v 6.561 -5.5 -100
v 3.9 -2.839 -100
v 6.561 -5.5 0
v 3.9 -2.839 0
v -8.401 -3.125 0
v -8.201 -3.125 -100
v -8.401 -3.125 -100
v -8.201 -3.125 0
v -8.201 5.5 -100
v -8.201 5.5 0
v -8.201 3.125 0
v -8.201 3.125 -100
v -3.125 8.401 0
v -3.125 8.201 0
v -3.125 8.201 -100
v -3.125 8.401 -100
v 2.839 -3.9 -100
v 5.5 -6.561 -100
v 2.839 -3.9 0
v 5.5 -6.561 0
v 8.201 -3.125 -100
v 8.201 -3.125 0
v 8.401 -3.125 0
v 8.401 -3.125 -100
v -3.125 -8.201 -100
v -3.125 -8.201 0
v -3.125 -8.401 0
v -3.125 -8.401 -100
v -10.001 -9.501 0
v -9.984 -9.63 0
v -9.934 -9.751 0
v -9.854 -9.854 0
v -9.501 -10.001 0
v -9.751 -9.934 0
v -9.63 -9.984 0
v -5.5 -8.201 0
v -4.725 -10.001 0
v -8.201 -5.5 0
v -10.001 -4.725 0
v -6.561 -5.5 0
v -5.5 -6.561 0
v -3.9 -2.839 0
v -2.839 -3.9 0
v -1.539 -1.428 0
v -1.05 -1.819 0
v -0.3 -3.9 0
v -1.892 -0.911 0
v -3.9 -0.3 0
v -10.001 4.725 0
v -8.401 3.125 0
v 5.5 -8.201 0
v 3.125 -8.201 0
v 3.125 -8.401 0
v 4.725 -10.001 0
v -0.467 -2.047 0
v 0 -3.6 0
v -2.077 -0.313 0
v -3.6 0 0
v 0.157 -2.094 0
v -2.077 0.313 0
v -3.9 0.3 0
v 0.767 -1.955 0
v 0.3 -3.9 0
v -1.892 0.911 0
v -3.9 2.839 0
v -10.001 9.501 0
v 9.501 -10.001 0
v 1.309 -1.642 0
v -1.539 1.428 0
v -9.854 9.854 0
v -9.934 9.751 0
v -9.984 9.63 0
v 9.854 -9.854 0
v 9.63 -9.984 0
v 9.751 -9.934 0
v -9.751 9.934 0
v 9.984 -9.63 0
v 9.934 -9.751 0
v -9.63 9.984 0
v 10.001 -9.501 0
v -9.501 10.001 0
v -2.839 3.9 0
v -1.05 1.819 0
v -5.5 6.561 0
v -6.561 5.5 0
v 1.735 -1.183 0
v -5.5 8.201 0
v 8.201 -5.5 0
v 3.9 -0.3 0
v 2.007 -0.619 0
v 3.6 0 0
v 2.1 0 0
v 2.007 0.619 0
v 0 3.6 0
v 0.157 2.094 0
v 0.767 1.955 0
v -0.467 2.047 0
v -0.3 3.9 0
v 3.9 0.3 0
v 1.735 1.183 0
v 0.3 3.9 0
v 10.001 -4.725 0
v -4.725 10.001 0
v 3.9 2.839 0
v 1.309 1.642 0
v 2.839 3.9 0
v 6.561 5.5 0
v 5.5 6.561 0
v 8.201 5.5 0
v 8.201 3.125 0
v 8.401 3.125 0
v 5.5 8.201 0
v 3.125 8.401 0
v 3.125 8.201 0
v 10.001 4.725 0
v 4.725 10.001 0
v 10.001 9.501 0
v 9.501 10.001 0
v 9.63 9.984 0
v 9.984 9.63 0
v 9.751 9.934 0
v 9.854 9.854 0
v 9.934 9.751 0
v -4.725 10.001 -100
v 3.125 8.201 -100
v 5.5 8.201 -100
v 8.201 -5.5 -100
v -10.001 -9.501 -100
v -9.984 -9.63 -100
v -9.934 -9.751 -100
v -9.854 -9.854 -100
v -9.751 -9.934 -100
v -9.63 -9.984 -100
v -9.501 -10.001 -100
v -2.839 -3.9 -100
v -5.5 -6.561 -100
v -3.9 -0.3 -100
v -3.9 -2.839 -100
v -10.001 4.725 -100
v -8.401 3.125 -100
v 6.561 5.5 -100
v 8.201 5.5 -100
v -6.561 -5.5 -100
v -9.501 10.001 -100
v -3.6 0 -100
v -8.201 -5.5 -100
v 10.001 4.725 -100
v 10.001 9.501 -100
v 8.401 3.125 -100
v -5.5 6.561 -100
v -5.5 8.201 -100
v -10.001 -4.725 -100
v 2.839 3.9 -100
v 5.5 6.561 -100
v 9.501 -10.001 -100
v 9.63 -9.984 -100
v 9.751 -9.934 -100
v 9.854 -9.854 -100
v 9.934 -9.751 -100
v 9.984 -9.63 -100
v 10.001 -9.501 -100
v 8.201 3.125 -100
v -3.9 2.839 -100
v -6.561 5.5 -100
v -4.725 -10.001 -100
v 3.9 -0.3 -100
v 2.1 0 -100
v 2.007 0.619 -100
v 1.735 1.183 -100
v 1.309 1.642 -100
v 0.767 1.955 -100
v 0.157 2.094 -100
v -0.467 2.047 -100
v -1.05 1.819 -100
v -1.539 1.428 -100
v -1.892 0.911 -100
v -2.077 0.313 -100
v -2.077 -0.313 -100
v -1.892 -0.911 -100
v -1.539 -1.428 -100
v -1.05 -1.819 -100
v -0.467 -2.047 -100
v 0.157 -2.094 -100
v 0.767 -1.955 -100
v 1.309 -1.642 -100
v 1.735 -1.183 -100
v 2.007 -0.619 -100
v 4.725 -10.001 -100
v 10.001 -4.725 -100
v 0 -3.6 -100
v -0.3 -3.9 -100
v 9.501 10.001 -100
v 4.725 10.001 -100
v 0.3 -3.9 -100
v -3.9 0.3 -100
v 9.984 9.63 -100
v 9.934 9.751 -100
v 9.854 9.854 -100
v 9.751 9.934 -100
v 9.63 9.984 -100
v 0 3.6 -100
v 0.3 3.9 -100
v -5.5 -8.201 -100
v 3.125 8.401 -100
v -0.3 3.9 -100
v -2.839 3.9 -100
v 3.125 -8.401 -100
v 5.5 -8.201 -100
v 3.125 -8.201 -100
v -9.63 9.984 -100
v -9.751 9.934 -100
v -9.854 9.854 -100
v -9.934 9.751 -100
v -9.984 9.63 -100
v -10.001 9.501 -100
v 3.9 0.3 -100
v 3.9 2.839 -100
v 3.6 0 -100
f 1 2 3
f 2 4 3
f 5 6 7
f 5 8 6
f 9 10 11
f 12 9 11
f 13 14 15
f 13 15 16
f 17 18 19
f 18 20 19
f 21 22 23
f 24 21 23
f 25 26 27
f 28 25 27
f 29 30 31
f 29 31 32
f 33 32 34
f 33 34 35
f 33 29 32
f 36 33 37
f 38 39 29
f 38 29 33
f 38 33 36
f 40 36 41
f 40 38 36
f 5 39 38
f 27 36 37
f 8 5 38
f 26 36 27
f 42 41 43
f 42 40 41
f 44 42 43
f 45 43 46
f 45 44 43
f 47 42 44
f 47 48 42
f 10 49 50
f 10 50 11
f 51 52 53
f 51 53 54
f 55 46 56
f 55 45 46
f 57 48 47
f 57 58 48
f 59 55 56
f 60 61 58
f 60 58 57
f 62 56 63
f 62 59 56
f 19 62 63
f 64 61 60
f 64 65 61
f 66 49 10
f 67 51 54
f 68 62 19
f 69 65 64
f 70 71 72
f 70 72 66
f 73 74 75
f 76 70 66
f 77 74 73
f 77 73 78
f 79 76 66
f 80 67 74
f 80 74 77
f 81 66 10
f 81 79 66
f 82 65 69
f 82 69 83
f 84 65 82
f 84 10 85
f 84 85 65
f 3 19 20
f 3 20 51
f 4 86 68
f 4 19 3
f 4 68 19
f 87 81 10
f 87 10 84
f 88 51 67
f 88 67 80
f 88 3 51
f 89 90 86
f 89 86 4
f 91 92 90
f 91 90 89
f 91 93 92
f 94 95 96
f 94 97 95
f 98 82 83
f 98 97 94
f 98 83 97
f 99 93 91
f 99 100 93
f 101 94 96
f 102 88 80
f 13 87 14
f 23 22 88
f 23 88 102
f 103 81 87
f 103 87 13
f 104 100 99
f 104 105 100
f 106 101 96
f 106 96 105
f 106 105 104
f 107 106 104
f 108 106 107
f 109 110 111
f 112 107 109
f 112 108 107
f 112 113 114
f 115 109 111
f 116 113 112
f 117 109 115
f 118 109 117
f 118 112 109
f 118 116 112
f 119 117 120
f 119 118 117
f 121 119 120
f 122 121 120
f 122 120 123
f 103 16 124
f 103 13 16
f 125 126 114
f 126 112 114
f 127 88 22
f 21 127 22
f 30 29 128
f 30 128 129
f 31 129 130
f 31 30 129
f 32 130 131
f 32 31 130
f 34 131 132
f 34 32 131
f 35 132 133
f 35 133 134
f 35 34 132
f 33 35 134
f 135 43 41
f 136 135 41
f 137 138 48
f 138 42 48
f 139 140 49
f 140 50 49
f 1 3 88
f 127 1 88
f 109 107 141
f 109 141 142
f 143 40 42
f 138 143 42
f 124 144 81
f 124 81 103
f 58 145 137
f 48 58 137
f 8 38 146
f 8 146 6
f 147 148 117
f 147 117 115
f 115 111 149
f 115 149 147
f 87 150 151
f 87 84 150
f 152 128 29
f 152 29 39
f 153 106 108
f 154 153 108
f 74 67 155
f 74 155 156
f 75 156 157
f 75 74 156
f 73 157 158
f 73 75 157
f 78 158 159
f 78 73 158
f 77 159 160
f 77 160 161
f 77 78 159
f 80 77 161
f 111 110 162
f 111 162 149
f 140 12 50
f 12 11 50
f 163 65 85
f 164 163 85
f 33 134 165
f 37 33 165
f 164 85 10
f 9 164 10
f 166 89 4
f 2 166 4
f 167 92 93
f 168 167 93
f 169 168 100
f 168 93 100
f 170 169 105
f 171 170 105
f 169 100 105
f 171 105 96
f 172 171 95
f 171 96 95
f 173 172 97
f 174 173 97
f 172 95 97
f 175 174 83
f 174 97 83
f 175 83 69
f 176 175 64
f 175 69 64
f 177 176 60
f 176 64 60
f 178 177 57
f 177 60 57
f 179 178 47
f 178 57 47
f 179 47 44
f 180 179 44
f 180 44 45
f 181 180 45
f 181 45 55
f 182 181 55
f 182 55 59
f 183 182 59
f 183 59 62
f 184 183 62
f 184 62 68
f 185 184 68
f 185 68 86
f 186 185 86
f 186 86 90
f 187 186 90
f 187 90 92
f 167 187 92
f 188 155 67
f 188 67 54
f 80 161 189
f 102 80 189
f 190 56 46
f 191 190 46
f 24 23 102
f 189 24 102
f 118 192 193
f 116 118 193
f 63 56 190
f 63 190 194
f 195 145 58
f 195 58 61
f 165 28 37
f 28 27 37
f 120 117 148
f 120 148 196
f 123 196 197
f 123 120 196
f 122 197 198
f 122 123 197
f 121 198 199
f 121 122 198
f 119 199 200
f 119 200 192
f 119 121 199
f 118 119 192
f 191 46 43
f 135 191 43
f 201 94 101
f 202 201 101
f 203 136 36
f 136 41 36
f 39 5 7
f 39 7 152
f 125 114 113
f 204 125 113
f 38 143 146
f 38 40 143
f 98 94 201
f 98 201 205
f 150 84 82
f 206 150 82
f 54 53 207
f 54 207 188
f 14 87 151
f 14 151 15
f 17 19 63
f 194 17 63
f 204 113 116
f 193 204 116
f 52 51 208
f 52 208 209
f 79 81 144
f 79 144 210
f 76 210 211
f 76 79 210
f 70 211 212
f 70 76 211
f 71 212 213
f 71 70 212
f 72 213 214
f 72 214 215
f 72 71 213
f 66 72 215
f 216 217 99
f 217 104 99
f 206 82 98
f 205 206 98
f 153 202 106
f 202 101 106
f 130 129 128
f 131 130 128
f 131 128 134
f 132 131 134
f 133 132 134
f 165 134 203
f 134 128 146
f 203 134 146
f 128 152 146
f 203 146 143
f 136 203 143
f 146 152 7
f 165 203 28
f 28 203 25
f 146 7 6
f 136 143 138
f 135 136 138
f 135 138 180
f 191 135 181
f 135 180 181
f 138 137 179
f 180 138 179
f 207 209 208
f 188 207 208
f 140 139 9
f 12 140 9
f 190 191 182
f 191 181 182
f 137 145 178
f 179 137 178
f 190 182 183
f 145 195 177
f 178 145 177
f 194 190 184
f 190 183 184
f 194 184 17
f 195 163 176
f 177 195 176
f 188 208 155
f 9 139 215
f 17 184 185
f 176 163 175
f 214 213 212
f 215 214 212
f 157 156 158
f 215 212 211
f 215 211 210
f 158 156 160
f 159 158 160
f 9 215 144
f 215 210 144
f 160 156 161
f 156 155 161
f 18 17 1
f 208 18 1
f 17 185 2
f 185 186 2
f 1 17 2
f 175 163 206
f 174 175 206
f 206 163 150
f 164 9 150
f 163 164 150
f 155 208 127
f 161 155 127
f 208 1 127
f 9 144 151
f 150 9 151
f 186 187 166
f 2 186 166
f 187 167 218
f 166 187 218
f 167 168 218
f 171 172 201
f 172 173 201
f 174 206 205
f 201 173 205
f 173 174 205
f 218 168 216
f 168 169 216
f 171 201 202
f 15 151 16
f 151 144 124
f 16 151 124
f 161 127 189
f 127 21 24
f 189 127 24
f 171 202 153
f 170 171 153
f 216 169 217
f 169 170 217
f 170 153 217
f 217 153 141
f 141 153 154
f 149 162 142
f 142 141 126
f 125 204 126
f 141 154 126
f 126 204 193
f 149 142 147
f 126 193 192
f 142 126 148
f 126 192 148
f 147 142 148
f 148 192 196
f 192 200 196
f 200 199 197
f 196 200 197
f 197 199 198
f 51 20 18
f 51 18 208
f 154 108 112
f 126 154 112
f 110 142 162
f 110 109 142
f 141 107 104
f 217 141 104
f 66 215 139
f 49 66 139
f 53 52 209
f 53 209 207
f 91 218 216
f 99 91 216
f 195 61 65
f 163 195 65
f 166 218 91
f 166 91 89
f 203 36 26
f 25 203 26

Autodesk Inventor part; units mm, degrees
ref_plane "YZ Plane" through (0, 0, 0) normal (1, 0, 0) x (0, 1, 0)
ref_plane "XZ Plane" through (0, 0, 0) normal (0, 1, 0) x (-1, 0, 0)
ref_plane "XY Plane" through (0, 0, 0) normal (0, 0, 1) x (1, 0, 0)
sketch "Sketch2" plane through (0, 0, 0) normal (0, 0, 1) x (1, 0, 0)
  arc A0 (-27.4375, 16.3608) -> (-26.9375, 16.8608) centre (-27.4375, 16.8608) ccw
  line L0 (-45.4375, 36.3608) -> (-46.4375, 36.3608)
  line L1 (-46.9375, 34.8608) -> (-46.9375, 35.8608)
  line L2 (-28.4375, 36.3608) -> (-27.4375, 36.3608)
  line L3 (-26.9375, 17.8608) -> (-26.9375, 16.8608)
  line L4 (-28.4375, 16.3608) -> (-27.4375, 16.3608)
  line L5 (-26.9375, 31.1923) -> (-26.9375, 35.8608)
  line L6 (-46.4375, 16.3608) -> (-41.7689, 16.3608)
  line L7 (-46.9375, 17.8608) -> (-46.9375, 16.8608)
  arc A1 (-46.9375, 16.8608) -> (-46.4375, 16.3608) centre (-46.4375, 16.8608) ccw
  arc A2 (-46.9375, 16.8608) -> (-46.4375, 16.3608) centre (-46.4375, 16.8608) ccw
  arc A3 (-46.4375, 36.3608) -> (-46.9375, 35.8608) centre (-46.4375, 35.8608) ccw
  arc A4 (-26.9375, 35.8608) -> (-27.4375, 36.3608) centre (-27.4375, 35.8608) ccw
  line L8 (-41.5004, 36.2982) -> (-41.5366, 36.3146)
  line L9 (-46.812, 30.8227) -> (-46.8352, 30.855)
  line L10 (-46.9375, 17.8608) -> (-46.9375, 21.4608)
  line L11 (-46.9362, 21.5691) -> (-46.9375, 21.4608)
  line L12 (-46.9258, 21.6478) -> (-46.9323, 21.6086)
  line L13 (-46.9323, 21.6086) -> (-46.9362, 21.5691)
  line L14 (-46.9168, 21.6865) -> (-46.9258, 21.6478)
  line L15 (-46.9053, 21.7245) -> (-46.9168, 21.6865)
  line L16 (-46.8913, 21.7617) -> (-46.9053, 21.7245)
  line L17 (-46.8749, 21.7979) -> (-46.8913, 21.7617)
  line L18 (-46.8561, 21.8329) -> (-46.8749, 21.7979)
  line L19 (-46.812, 21.8989) -> (-46.8352, 21.8667)
  line L20 (-46.8352, 21.8667) -> (-46.8561, 21.8329)
  line L21 (-41.4654, 36.2795) -> (-41.5004, 36.2982)
  line L22 (-46.7868, 21.9297) -> (-46.812, 21.8989)
  line L23 (-46.7597, 21.9586) -> (-46.7868, 21.9297)
  line L24 (-46.7597, 21.9586) -> (-45.2441, 23.4742)
  line L25 (-45.2441, 23.4742) -> (-45.1375, 23.4742)
  line L26 (-45.1375, 23.4742) -> (-45.1375, 20.8608)
  line L27 (-45.1375, 20.8608) -> (-43.4981, 20.8608)
  line L28 (-43.4981, 20.8608) -> (-40.8375, 23.5215)
  line L29 (-46.7868, 30.792) -> (-46.812, 30.8227)
  line L30 (-40.8375, 26.161) -> (-40.8375, 23.5215)
  line L31 (-40.6376, 26.3608) -> (-40.8375, 26.161)
  line L32 (-40.6376, 26.3608) -> (-40.8375, 26.5607)
  line L33 (-40.8375, 29.2002) -> (-40.8375, 26.5607)
  line L34 (-43.4981, 31.8608) -> (-40.8375, 29.2002)
  line L35 (-45.1375, 31.8608) -> (-43.4981, 31.8608)
  line L36 (-45.1375, 29.2475) -> (-45.1375, 31.8608)
  line L37 (-46.7597, 30.763) -> (-46.7868, 30.792)
  line L38 (-45.2441, 29.2475) -> (-45.1375, 29.2475)
  line L39 (-45.2441, 29.2475) -> (-46.7597, 30.763)
  line L40 (-28.7375, 20.8608) -> (-30.3768, 20.8608)
  line L41 (-41.5738, 36.3286) -> (-41.6118, 36.3402)
  line L42 (-41.3687, 36.2102) -> (-41.3994, 36.2354)
  line L43 (-41.3397, 36.183) -> (-41.3687, 36.2102)
  line L44 (-41.6118, 36.3402) -> (-41.6505, 36.3492)
  line L45 (-41.7292, 16.3621) -> (-41.7689, 16.3608)
  line L46 (-41.6897, 16.366) -> (-41.7292, 16.3621)
  line L47 (-41.6505, 16.3725) -> (-41.6897, 16.366)
  line L48 (-41.6118, 16.3815) -> (-41.6505, 16.3725)
  line L49 (-41.5738, 16.3931) -> (-41.6118, 16.3815)
  line L50 (-41.5366, 16.4071) -> (-41.5738, 16.3931)
  line L51 (-42.4375, 32.9215) -> (-39.7768, 30.2608)
  line L52 (-41.5004, 16.4235) -> (-41.5366, 16.4071)
  line L53 (-41.4654, 16.4422) -> (-41.5004, 16.4235)
  line L54 (-41.4317, 16.4632) -> (-41.4654, 16.4422)
  line L55 (-41.3994, 16.4863) -> (-41.4317, 16.4632)
  line L56 (-41.3687, 16.5115) -> (-41.3994, 16.4863)
  line L57 (-41.3397, 16.5386) -> (-41.3687, 16.5115)
  line L58 (-41.3397, 16.5386) -> (-39.8241, 18.0542)
  line L59 (-39.8241, 18.0542) -> (-39.8241, 18.1608)
  line L60 (-39.8241, 18.1608) -> (-42.4375, 18.1608)
  line L61 (-42.4375, 18.1608) -> (-42.4375, 19.8002)
  line L62 (-42.4375, 19.8002) -> (-39.7768, 22.4608)
  line L63 (-39.7768, 22.4608) -> (-37.1444, 22.4608)
  line L64 (-37.1444, 22.4608) -> (-36.9375, 22.6656)
  line L65 (-36.9375, 22.6656) -> (-36.7327, 22.4608)
  line L66 (-36.7327, 22.4608) -> (-34.0981, 22.4608)
  line L67 (-34.0981, 22.4608) -> (-31.4375, 19.8002)
  line L68 (-31.4375, 18.1608) -> (-31.4375, 19.8002)
  line L69 (-41.3397, 36.183) -> (-39.8241, 34.6675)
  line L70 (-34.0508, 18.1608) -> (-31.4375, 18.1608)
  line L71 (-41.6505, 36.3492) -> (-41.6897, 36.3557)
  line L72 (-34.0508, 18.0542) -> (-34.0508, 18.1608)
  line L73 (-34.0508, 18.0542) -> (-32.5353, 16.5387)
  line L74 (-32.5353, 16.5387) -> (-32.5063, 16.5115)
  line L75 (-32.5063, 16.5115) -> (-32.4756, 16.4863)
  line L76 (-32.4756, 16.4863) -> (-32.4433, 16.4632)
  line L77 (-32.4433, 16.4632) -> (-32.4096, 16.4422)
  line L78 (-32.4096, 16.4422) -> (-32.3745, 16.4235)
  line L79 (-32.3745, 16.4235) -> (-32.3383, 16.4071)
  line L80 (-32.3383, 16.4071) -> (-32.3012, 16.3931)
  line L81 (-32.3012, 16.3931) -> (-32.2631, 16.3815)
  line L82 (-32.2631, 16.3815) -> (-32.2245, 16.3725)
  line L83 (-32.2245, 16.3725) -> (-32.1853, 16.366)
  line L84 (-32.1853, 16.366) -> (-32.1457, 16.3621)
  line L85 (-32.1457, 16.3621) -> (-32.106, 16.3608)
  line L86 (-28.4375, 16.3608) -> (-32.106, 16.3608)
  line L87 (-39.8241, 34.6675) -> (-39.8241, 34.5608)
  line L88 (-41.6897, 36.3557) -> (-41.7292, 36.3595)
  line L89 (-26.9375, 17.8608) -> (-26.9375, 21.5294)
  line L90 (-26.9388, 21.5691) -> (-26.9375, 21.5294)
  line L91 (-26.9427, 21.6086) -> (-26.9388, 21.5691)
  line L92 (-26.9491, 21.6478) -> (-26.9427, 21.6086)
  line L93 (-26.9582, 21.6865) -> (-26.9491, 21.6478)
  line L94 (-26.9697, 21.7245) -> (-26.9582, 21.6865)
  line L95 (-26.9837, 21.7617) -> (-26.9697, 21.7245)
  line L96 (-27.0001, 21.7979) -> (-26.9837, 21.7617)
  line L97 (-41.7292, 36.3595) -> (-41.7689, 36.3608)
  line L98 (-27.0188, 21.8329) -> (-27.0001, 21.7979)
  line L99 (-27.0398, 21.8667) -> (-27.0188, 21.8329)
  line L100 (-27.0629, 21.8989) -> (-27.0398, 21.8667)
  line L101 (-27.0881, 21.9297) -> (-27.0629, 21.8989)
  line L102 (-27.1153, 21.9587) -> (-27.0881, 21.9297)
  line L103 (-28.6308, 23.4742) -> (-27.1153, 21.9587)
  line L104 (-28.6308, 23.4742) -> (-28.7375, 23.4742)
  line L105 (-28.7375, 23.4742) -> (-28.7375, 20.8608)
  line L106 (-32.3012, 36.3286) -> (-32.2631, 36.3402)
  line L107 (-30.3768, 20.8608) -> (-33.0375, 23.5215)
  line L108 (-33.0375, 23.5215) -> (-33.0375, 26.161)
  line L109 (-33.2373, 26.3608) -> (-33.0375, 26.161)
  line L110 (-33.2373, 26.3608) -> (-33.0375, 26.5607)
  line L111 (-33.0375, 29.2002) -> (-33.0375, 26.5607)
  line L112 (-30.3768, 31.8608) -> (-33.0375, 29.2002)
  line L113 (-45.4375, 36.3608) -> (-41.7689, 36.3608)
  line L114 (-28.6308, 29.2475) -> (-28.7375, 29.2475)
  line L115 (-28.7375, 31.8608) -> (-30.3768, 31.8608)
  line L116 (-28.7375, 29.2475) -> (-28.7375, 31.8608)
  line L117 (-27.1153, 30.763) -> (-28.6308, 29.2475)
  line L118 (-27.1153, 30.763) -> (-27.0881, 30.792)
  line L119 (-27.0881, 30.792) -> (-27.0629, 30.8227)
  line L120 (-27.0629, 30.8227) -> (-27.0398, 30.855)
  line L121 (-27.0398, 30.855) -> (-27.0188, 30.8888)
  line L122 (-27.0188, 30.8888) -> (-27.0001, 30.9238)
  line L123 (-27.0001, 30.9238) -> (-26.9837, 30.96)
  line L124 (-26.9837, 30.96) -> (-26.9697, 30.9972)
  line L125 (-26.9697, 30.9972) -> (-26.9582, 31.0352)
  line L126 (-26.9582, 31.0352) -> (-26.9491, 31.0739)
  line L127 (-26.9491, 31.0739) -> (-26.9427, 31.1131)
  line L128 (-26.9427, 31.1131) -> (-26.9388, 31.1526)
  line L129 (-26.9388, 31.1526) -> (-26.9375, 31.1923)
  line L130 (-39.8241, 34.5608) -> (-42.4375, 34.5608)
  line L131 (-28.4375, 36.3608) -> (-32.106, 36.3608)
  line L132 (-32.1457, 36.3595) -> (-32.106, 36.3608)
  line L133 (-32.1853, 36.3557) -> (-32.1457, 36.3595)
  line L134 (-32.2631, 36.3402) -> (-32.2245, 36.3492)
  line L135 (-32.3383, 36.3146) -> (-32.3012, 36.3286)
  line L136 (-32.3745, 36.2982) -> (-32.3383, 36.3146)
  line L137 (-32.4096, 36.2795) -> (-32.3745, 36.2982)
  line L138 (-32.4433, 36.2585) -> (-32.4096, 36.2795)
  line L139 (-32.4756, 36.2354) -> (-32.4433, 36.2585)
  line L140 (-32.5063, 36.2102) -> (-32.4756, 36.2354)
  line L141 (-46.9323, 31.1131) -> (-46.9362, 31.1526)
  line L142 (-34.0508, 34.6675) -> (-32.5353, 36.183)
  line L143 (-34.0508, 34.6675) -> (-34.0508, 34.5608)
  line L144 (-34.0508, 34.5608) -> (-31.4375, 34.5608)
  line L145 (-31.4375, 34.5608) -> (-31.4375, 32.9215)
  line L146 (-34.0981, 30.2608) -> (-31.4375, 32.9215)
  line L147 (-34.0981, 30.2608) -> (-36.7327, 30.2608)
  line L148 (-42.4375, 34.5608) -> (-42.4375, 32.9215)
  line L149 (-36.7327, 30.2608) -> (-36.9375, 30.0561)
  line L150 (-37.1422, 30.2608) -> (-36.9375, 30.0561)
  line L151 (-39.7768, 30.2608) -> (-37.1422, 30.2608)
  line L152 (-32.5353, 36.183) -> (-32.5063, 36.2102)
  line L153 (-41.3994, 36.2354) -> (-41.4317, 36.2585)
  line L154 (-46.9258, 31.0739) -> (-46.9323, 31.1131)
  line L155 (-41.4317, 36.2585) -> (-41.4654, 36.2795)
  line L156 (-46.9362, 31.1526) -> (-46.9375, 31.2608)
  line L157 (-46.9168, 31.0352) -> (-46.9258, 31.0739)
  line L158 (-46.9375, 34.8608) -> (-46.9375, 31.2608)
  line L159 (-46.9053, 30.9972) -> (-46.9168, 31.0352)
  line L160 (-46.8913, 30.96) -> (-46.9053, 30.9972)
  line L161 (-46.8749, 30.9238) -> (-46.8913, 30.96)
  line L162 (-46.8561, 30.8888) -> (-46.8749, 30.9238)
  line L163 (-32.2245, 36.3492) -> (-32.1853, 36.3557)
  line L164 (-41.5366, 36.3146) -> (-41.5738, 36.3286)
  line L165 (-46.8352, 30.855) -> (-46.8561, 30.8888)
  circle A5 centre (-36.9375, 26.3608) radius 2.1
  line L166 (3.9, -0.3) -> (3.9, -2.8393)
  line L167 (2.8393, -3.9) -> (0.3, -3.9)
  line L168 (5.5, -6.5607) -> (2.8393, -3.9)
  line L169 (3.9, -2.8393) -> (6.5607, -5.5)
  line L170 (6.5607, -5.5) -> (8.2007, -5.5)
  line L171 (8.2007, -5.5) -> (8.2007, -3.125)
  line L172 (8.2007, -3.125) -> (8.4007, -3.125)
  line L173 (8.4007, -3.125) -> (10.0007, -4.725)
  line L174 (10.0007, -9.5007) -> (10.0007, -4.725)
  line L175 (5.5, -6.5607) -> (5.5, -8.2007)
  line L176 (5.5, -8.2007) -> (3.125, -8.2007)
  line L177 (3.125, -8.2007) -> (3.125, -8.4007)
  line L178 (3.125, -8.4007) -> (4.725, -10.0007)
  line L179 (9.5007, -10.0007) -> (4.725, -10.0007)
  arc A6 (9.5007, -10.0007) -> (10.0007, -9.5007) centre (9.5007, -9.5007) ccw
  line L180 (0, -3.6) -> (0.3, -3.9)
  line L181 (3.6, 0) -> (3.9, -0.3)
  line L182 (3.125, 8.2007) -> (3.125, 8.4007)
  line L183 (0.3, 3.9) -> (2.8393, 3.9)
  line L184 (5.5, 8.2007) -> (3.125, 8.2007)
  line L185 (2.8393, 3.9) -> (5.5, 6.5607)
  line L186 (3.9, 2.8393) -> (3.9, 0.3)
  line L187 (3.6, 0) -> (3.9, 0.3)
  line L188 (6.5607, 5.5) -> (3.9, 2.8393)
  line L189 (5.5, 6.5607) -> (5.5, 8.2007)
  line L190 (3.125, 8.4007) -> (4.725, 10.0007)
  line L191 (6.5607, 5.5) -> (8.2007, 5.5)
  line L192 (8.2007, 5.5) -> (8.2007, 3.125)
  line L193 (8.2007, 3.125) -> (8.4007, 3.125)
  line L194 (8.4007, 3.125) -> (10.0007, 4.725)
  line L195 (9.5007, 10.0007) -> (4.725, 10.0007)
  arc A7 (10.0007, 9.5007) -> (9.5007, 10.0007) centre (9.5007, 9.5007) ccw
  line L196 (10.0007, 9.5007) -> (10.0007, 4.725)
  line L197 (0, 3.6) -> (0.3, 3.9)
  line L198 (-8.2007, 3.125) -> (-8.4007, 3.125)
  line L199 (-3.9, 0.3) -> (-3.9, 2.8393)
  line L200 (-8.2007, 5.5) -> (-8.2007, 3.125)
  line L201 (-3.9, 2.8393) -> (-6.5607, 5.5)
  line L202 (-2.8393, 3.9) -> (-0.3, 3.9)
  line L203 (0, 3.6) -> (-0.3, 3.9)
  line L204 (-5.5, 6.5607) -> (-2.8393, 3.9)
  line L205 (-6.5607, 5.5) -> (-8.2007, 5.5)
  line L206 (-8.4007, 3.125) -> (-10.0007, 4.725)
  line L207 (-5.5, 6.5607) -> (-5.5, 8.2007)
  line L208 (-5.5, 8.2007) -> (-3.125, 8.2007)
  line L209 (-3.125, 8.2007) -> (-3.125, 8.4007)
  line L210 (-3.125, 8.4007) -> (-4.725, 10.0007)
  line L211 (-10.0007, 9.5007) -> (-10.0007, 4.725)
  arc A8 (-9.5007, 10.0007) -> (-10.0007, 9.5007) centre (-9.5007, 9.5007) ccw
  line L212 (-9.5007, 10.0007) -> (-4.725, 10.0007)
  line L213 (-3.6, 0) -> (-3.9, 0.3)
  line L214 (-3.125, -8.2007) -> (-3.125, -8.4007)
  line L215 (-0.3, -3.9) -> (-2.8393, -3.9)
  line L216 (-5.5, -8.2007) -> (-3.125, -8.2007)
  line L217 (-2.8393, -3.9) -> (-5.5, -6.5607)
  line L218 (-3.9, -2.8393) -> (-3.9, -0.3)
  line L219 (-3.6, 0) -> (-3.9, -0.3)
  line L220 (-6.5607, -5.5) -> (-3.9, -2.8393)
  line L221 (-5.5, -6.5607) -> (-5.5, -8.2007)
  line L222 (-3.125, -8.4007) -> (-4.725, -10.0007)
  line L223 (-6.5607, -5.5) -> (-8.2007, -5.5)
  line L224 (-8.2007, -5.5) -> (-8.2007, -3.125)
  line L225 (-8.2007, -3.125) -> (-8.4007, -3.125)
  line L226 (-8.4007, -3.125) -> (-10.0007, -4.725)
  line L227 (-9.5007, -10.0007) -> (-4.725, -10.0007)
  arc A9 (-10.0007, -9.5007) -> (-9.5007, -10.0007) centre (-9.5007, -9.5007) ccw
  line L228 (-10.0007, -9.5007) -> (-10.0007, -4.725)
  line L229 (0, -3.6) -> (-0.3, -3.9)
  circle A10 centre (0, 0) radius 2.1
  point P0 (0, -3.9)
  point P1 (3.9, 0)
  point P2 (3.9, 0)
  point P3 (0, 3.9)
  point P4 (0, 3.9)
  point P5 (3.9, 0)
  point P6 (-3.9, 0)
  point P7 (-3.9, 0)
  point P8 (0, 3.9)
  point P9 (0, -3.9)
  point P10 (0, -3.9)
  point P11 (-3.9, 0)
  dimension "d1" = 4.2
  dimension "d2" = 1.5
  dimension "d4" = 3.9
  dimension "d5" = 3.9
  dimension "d7" = 1.5
  dimension "d9" = 1.64
  dimension "d10" = 135
  dimension "d11" = 1.8
  dimension "d12" = 3.125
  dimension "d13" = 5.5
  dimension "d14" = 45
  dimension "d15" = 0.2
  dimension "d16" = 0.5
  dimension "d17" = 0.3
  dimension "d18" = 0.3
  dimension "d19" = 0.3
  dimension "d20" = 0.3
  dimension "d23" = 360
  dimension "d25" = 4.2
extrude "Extrusion1" add sketch "Sketch2" against normal blind 100 contours L166 L169 L170 L171 L172 L173 L174 A6 L179 L178 L177 L176 L175 L168 L167 L180 L229 L215 L217 L221 L216 L214 L222 L227 A9 L228 L226 L225 L224 L223 L220 L218 L219 L213 L199 L201 L205 L200 L198 L206 L211 A8 L212 L210 L209 L208 L207 L204 L202 L203 L197 L183 L185 L189 L184 L182 L190 L195 A7 L196 L194 L193 L192 L191 L188 L186 L187 L181
equation "\"d5\" = d4"
equation "\"d18\" = d17"
equation "\"d20\" = d19"
properties part number "v-slot"
